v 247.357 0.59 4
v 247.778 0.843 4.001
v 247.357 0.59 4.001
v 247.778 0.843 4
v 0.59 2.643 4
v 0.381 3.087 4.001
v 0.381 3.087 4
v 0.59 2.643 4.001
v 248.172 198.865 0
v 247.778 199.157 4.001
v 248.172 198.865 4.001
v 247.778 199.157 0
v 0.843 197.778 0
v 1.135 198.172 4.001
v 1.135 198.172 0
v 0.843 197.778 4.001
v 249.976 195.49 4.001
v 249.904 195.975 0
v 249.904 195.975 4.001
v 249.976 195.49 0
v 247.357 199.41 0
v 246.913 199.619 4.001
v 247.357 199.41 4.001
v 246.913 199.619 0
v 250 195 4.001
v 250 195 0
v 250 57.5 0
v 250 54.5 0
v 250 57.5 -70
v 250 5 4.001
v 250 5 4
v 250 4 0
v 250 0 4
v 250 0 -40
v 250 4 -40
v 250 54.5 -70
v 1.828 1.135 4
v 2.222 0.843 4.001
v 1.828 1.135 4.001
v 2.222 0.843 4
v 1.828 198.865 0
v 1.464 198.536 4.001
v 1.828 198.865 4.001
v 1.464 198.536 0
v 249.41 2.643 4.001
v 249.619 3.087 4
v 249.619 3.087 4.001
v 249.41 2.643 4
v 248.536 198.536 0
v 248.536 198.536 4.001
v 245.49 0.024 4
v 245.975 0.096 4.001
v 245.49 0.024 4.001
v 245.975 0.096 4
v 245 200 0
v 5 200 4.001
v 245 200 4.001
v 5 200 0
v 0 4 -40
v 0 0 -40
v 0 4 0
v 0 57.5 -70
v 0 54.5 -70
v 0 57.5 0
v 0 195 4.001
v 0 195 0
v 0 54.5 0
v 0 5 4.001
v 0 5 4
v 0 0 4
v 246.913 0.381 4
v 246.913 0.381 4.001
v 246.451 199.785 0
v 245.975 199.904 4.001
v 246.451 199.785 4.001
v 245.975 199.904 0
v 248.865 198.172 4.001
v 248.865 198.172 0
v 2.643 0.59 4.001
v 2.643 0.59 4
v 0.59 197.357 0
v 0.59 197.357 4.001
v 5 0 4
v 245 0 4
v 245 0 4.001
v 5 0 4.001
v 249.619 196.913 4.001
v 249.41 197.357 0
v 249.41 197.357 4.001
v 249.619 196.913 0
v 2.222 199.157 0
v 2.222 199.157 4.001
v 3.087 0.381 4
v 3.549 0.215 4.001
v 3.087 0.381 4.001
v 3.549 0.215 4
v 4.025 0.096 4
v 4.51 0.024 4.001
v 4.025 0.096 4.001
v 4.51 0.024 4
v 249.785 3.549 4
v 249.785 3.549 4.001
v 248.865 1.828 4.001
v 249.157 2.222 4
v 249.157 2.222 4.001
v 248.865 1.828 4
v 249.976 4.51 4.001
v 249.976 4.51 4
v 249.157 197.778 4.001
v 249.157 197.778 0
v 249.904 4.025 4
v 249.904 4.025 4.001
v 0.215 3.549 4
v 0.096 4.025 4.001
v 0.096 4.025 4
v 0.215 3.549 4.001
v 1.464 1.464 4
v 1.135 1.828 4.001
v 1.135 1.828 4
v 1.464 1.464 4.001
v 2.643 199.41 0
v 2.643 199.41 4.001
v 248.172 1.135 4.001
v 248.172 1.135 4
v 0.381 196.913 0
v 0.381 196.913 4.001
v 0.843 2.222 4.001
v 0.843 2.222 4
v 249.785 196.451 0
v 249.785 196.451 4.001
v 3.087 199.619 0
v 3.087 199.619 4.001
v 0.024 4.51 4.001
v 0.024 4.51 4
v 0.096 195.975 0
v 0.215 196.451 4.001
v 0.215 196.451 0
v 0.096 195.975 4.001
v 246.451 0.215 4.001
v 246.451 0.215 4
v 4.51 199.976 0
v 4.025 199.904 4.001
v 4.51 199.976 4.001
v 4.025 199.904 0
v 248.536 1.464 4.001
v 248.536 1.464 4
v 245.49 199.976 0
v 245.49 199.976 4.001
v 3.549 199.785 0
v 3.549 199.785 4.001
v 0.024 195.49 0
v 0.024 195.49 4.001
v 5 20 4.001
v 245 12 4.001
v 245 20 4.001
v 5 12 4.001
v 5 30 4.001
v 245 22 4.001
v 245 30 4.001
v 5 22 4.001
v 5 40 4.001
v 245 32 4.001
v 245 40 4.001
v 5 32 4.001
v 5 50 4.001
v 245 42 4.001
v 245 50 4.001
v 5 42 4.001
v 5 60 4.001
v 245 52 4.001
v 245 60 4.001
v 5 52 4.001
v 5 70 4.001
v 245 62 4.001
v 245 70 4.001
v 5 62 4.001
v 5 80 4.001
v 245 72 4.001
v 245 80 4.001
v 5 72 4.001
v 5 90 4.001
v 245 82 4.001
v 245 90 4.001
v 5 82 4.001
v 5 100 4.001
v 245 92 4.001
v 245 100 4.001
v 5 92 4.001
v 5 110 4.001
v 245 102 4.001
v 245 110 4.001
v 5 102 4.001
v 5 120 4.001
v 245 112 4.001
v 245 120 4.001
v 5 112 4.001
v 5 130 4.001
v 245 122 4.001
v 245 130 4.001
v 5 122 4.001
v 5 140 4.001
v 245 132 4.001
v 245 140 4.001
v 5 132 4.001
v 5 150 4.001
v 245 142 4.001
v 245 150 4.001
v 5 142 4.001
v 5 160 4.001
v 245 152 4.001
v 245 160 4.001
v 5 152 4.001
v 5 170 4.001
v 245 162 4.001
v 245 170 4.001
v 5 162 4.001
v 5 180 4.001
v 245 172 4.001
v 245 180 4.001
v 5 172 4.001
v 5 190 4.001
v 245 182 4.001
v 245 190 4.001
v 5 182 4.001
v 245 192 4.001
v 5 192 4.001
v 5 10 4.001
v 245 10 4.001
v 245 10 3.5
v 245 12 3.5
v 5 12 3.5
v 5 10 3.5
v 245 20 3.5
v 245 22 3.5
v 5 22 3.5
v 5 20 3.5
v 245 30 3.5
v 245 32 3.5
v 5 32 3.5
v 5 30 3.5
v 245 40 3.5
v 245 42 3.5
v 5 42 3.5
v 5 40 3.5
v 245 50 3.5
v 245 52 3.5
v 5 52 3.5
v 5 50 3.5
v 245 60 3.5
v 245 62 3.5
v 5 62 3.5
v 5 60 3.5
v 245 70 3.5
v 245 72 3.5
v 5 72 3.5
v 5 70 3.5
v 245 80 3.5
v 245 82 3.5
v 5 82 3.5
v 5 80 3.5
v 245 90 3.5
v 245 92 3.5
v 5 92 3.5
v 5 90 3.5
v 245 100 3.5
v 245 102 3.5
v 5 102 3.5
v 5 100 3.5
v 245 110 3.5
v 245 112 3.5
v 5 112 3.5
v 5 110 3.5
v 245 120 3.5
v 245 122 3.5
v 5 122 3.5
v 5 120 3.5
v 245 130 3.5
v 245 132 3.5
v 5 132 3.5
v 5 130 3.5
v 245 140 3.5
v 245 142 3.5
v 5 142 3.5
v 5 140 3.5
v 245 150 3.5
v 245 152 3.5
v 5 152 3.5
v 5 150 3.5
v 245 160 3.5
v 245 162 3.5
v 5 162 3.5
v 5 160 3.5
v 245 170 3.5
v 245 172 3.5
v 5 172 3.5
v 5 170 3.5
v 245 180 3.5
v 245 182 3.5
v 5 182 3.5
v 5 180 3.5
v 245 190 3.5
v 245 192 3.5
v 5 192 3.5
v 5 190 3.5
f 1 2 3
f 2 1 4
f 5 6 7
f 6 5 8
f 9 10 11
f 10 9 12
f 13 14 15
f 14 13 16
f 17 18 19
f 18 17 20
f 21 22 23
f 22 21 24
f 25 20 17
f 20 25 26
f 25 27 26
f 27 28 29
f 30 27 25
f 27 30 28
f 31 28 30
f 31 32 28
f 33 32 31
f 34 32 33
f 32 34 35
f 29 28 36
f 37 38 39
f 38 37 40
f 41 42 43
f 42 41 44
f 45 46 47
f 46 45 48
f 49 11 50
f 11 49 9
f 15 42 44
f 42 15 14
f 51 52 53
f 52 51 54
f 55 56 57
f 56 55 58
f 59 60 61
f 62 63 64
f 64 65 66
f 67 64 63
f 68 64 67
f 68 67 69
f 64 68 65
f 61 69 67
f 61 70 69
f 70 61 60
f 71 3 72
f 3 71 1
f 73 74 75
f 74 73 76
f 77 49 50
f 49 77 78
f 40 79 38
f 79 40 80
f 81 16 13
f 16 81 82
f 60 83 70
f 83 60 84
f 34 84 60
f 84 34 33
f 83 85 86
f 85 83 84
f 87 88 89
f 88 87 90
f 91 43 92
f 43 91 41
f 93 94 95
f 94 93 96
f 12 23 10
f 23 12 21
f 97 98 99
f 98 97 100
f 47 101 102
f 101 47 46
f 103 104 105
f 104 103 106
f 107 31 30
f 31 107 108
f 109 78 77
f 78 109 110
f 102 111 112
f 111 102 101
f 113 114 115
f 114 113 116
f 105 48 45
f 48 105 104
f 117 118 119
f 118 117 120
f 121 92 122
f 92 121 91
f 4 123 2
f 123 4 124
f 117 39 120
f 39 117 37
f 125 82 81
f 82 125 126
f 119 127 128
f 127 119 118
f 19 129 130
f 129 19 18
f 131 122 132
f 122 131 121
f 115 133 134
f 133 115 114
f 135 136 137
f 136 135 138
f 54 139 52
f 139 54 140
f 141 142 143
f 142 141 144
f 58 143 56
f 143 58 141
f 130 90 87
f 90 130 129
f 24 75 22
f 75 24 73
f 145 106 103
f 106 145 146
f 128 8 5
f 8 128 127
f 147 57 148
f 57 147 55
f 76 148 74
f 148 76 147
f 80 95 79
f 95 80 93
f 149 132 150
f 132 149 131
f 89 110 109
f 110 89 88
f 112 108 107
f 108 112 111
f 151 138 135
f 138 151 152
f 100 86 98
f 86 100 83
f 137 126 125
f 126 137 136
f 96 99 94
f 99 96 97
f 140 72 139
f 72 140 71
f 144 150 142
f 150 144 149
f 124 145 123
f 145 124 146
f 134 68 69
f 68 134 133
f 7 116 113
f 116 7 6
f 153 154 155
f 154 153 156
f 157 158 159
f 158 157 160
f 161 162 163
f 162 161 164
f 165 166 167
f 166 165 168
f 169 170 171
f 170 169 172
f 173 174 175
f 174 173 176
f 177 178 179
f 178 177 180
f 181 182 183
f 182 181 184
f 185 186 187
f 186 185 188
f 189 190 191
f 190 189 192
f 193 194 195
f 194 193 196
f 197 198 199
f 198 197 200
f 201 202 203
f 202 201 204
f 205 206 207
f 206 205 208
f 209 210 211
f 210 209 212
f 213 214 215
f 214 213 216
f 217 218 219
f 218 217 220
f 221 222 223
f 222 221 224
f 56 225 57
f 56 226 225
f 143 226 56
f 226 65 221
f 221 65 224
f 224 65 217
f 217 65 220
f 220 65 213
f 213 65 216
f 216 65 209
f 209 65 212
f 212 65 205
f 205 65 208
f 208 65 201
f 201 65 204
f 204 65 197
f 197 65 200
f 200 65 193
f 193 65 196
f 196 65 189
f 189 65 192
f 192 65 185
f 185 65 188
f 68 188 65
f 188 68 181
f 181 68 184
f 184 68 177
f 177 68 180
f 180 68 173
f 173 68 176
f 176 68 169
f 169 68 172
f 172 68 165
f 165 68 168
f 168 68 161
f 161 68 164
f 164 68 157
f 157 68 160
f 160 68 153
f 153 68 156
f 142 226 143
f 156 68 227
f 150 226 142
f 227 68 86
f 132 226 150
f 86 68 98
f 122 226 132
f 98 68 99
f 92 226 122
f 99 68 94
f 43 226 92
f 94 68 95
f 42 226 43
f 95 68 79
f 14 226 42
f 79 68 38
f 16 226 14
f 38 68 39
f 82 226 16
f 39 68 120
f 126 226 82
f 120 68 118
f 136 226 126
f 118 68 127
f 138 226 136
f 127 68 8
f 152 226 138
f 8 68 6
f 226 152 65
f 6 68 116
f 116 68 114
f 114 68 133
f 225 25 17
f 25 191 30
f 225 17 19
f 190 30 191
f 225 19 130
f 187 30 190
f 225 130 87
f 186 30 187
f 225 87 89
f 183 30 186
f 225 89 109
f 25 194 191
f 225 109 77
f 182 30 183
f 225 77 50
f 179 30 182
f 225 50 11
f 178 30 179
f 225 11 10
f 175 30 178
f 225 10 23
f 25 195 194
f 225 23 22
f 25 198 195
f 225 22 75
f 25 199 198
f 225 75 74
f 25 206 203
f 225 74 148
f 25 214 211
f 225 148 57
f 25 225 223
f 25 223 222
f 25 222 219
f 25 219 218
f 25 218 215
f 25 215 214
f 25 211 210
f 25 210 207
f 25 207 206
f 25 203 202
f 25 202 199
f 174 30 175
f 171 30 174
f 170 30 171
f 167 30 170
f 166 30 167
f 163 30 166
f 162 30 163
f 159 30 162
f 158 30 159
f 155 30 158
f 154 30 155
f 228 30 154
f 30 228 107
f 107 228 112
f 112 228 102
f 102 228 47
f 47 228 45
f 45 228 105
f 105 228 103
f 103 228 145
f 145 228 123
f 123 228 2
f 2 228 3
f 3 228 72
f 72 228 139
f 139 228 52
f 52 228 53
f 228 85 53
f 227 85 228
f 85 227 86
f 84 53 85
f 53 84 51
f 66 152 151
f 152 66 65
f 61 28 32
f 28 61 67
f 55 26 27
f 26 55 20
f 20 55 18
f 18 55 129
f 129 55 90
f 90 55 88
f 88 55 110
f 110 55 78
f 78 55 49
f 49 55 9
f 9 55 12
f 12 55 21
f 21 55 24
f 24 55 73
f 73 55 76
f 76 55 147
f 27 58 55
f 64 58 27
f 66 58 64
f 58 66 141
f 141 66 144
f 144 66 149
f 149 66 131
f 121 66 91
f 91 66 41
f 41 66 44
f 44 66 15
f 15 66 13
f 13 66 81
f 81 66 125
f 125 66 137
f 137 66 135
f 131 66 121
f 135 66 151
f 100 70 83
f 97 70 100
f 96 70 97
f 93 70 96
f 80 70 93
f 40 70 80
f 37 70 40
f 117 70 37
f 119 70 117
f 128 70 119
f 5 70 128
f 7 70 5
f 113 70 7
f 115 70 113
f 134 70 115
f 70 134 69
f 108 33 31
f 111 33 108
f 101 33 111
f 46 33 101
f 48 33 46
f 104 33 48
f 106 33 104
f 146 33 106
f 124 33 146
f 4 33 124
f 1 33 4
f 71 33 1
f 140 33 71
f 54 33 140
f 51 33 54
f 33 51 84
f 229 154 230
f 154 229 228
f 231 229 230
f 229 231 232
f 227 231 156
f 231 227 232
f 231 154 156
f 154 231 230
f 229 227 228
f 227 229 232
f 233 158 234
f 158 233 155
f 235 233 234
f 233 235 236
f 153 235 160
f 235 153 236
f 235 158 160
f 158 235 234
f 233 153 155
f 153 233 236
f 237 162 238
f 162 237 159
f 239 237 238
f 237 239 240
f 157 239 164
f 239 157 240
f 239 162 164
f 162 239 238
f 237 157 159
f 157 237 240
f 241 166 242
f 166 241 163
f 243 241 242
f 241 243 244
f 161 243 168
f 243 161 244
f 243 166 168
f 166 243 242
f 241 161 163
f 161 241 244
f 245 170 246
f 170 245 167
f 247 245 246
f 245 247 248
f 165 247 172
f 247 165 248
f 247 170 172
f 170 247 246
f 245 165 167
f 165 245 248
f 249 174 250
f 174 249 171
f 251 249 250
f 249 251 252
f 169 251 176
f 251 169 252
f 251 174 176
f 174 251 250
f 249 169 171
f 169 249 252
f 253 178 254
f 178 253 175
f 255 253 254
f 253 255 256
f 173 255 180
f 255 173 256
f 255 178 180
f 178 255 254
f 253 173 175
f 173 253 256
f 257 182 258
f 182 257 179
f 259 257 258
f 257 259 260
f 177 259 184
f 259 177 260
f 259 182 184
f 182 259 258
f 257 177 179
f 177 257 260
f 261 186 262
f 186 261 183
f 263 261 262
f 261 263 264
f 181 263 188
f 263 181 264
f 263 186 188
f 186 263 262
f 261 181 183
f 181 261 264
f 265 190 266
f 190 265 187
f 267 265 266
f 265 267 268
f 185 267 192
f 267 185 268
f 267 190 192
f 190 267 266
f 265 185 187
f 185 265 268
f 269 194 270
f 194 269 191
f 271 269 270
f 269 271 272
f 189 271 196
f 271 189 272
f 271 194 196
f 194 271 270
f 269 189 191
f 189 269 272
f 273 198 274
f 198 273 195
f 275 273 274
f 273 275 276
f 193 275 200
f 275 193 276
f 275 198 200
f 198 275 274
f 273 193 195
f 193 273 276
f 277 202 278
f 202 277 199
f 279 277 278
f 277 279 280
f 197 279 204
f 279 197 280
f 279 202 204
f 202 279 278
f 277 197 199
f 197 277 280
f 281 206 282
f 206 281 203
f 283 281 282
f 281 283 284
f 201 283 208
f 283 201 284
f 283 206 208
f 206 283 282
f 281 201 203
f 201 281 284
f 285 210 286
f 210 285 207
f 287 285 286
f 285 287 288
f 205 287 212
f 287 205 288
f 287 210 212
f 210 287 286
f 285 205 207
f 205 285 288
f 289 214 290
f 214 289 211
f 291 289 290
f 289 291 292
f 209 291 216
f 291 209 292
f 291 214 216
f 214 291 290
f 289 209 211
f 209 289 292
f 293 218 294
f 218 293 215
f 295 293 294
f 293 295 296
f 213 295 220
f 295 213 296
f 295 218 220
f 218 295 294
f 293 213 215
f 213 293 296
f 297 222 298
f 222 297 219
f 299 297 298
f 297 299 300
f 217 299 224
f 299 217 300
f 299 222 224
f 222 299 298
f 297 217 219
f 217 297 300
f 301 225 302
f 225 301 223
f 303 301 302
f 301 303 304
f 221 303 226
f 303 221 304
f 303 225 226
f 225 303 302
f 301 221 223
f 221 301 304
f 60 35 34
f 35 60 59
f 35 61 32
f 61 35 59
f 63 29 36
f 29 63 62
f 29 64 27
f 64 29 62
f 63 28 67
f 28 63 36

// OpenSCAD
//
// Wohnmobil-Fensterbank
// Parametrisches Modell mit optimierter Customizer-Struktur
//

// ----------------------------------------------------------------------
// --- PARAMETER ---
// ----------------------------------------------------------------------

/* [A. GRUNDDIMENSIONEN PLATTE] */
// Breite (X)
01_shelf_width     = 250;   // [50:1:500]
// Tiefe (Y)
01_shelf_depth     = 200;   // [50:1:300]
// Dicke der Platte (Z)
01_shelf_thickness = 4;     // [2:0.5:10]

/* [B. KANTEN & VERFEINERUNG] */
// Radius der Abrundung (Vorder- und Seitenkanten)
02_front_radius    = 5;     // [0:0.5:10]

/* [C. ANTI-RUTSCH RILLEN (Vertiefungen)] */
03_grooves_enabled = true;   // [false, true] EIN/AUS-Schalter
// Tiefe der Rille
03_groove_depth    = 0.5;   // [0.1:0.1:2]
// Breite der Rille (entlang Y)
03_groove_width_x  = 2;     // [0.5:0.5:5]
// Abstand der Rillen (Mitte zu Mitte in Y)
03_groove_spacing_y= 10;    // [5:1:30]
// Startposition in Y (vom hinteren Rand y=0)
03_groove_offset_y = 10;    // [0:1:50]

/* [D. KLEMMUNG / HALTERUNG] */
// Abstand zwischen den INNENflächen der Halter (zu greifendes Element)
04_board_thickness = 50;    // [10:1:100]
// Spiel für die Klemmung (Anpassung an Druckergenauigkeit)
04_fit_clearance   = 0.5;   // [0:0.05:1]

/* [E. HALTERUNGS-MASSE] */
// Dicke des äußeren Halters (Y)
05_outer_br_thickness = 4;   // [1:1:10]
// Höhe des äußeren Halters (Z)
05_outer_br_height    = 40;  // [10:1:100]
// Dicke des inneren Halters (Y)
05_inner_br_thickness = 3;   // [1:1:10]
// Höhe des inneren Halters (Z)
05_inner_br_height    = 70;  // [10:1:100]

/* [F. OPTIONALER RAND (Deaktiviert)] */
06_rim_enabled     = false;  // [false, true] Rand an/aus
// Breite / Dicke des Randes (X/Y)
06_rim_width       = 5;     // [1:1:10]
// Höhe des Randes nach unten (Z)
06_rim_height      = 5;     // [1:1:10]


// ----------------------------------------------------------------------
// ---------- MODULE ----------
// (Alle Modul-Variablen wurden mit den entsprechenden Präfixen angepasst)
// ----------------------------------------------------------------------

// Modul zum Erstellen der Rillen (wird subtrahiert)
module anti_slip_grooves() {
   
    if (03_grooves_enabled) {
        
        num_grooves = floor((01_shelf_depth - 03_groove_offset_y) / 03_groove_spacing_y);
        
        for (i = [0 : 1 : num_grooves - 1]) {
            
            current_y = 03_groove_offset_y + i * 03_groove_spacing_y;
            groove_start_x = 02_front_radius; 
            groove_length_x = 01_shelf_width - 2 * 02_front_radius;
            
            // Rillenobjekt (Cube)
            translate([groove_start_x, current_y, 01_shelf_thickness - 03_groove_depth])
            cube([groove_length_x, 03_groove_width_x, 03_groove_depth + 0.01], center = false);
        }
    }
}


// Grundplatte + optionaler Rim
module base_plate_with_rim() {

    // --- 1. Korrigierte Grundplatte (Positiv-Objekt) ---
    difference() {
        
        union() {
            // a) Verrundeter Hauptteil
            translate([02_front_radius, 02_front_radius, 0])
            minkowski() {
                cube([01_shelf_width - 2*02_front_radius, 01_shelf_depth - 2*02_front_radius, 01_shelf_thickness], center = false);
                cylinder(r = 02_front_radius, h = 0.001, $fn = 64);
            }
            
            // b) Hinterer, gerader Teil
            translate([0, 0, 0])
                cube([01_shelf_width, 02_front_radius, 01_shelf_thickness], center = false);
        }
        
        // 2. Die ANTI-RUTSCH RILLEN (Negativ-Objekt)
        anti_slip_grooves();
        
    }
    
    // --- 2. Optionaler Rim (Derzeit deaktiviert) ---
    if (06_rim_enabled && 06_rim_height > 0 && 06_rim_width > 0) {
        
        inner_br_start_y = 05_outer_br_thickness + 04_board_thickness + 04_fit_clearance;
        inner_br_front_y = inner_br_start_y + 05_inner_br_thickness;
        rim_y_start = inner_br_front_y;
        rim_y_end   = 01_shelf_depth - 02_front_radius;
        rim_depth_y = rim_y_end - rim_y_start;
        
        if (rim_depth_y > 0) {
            
            rim_front_thickness = 06_rim_width;
            
            // FRONT-RAND (Verrundet)
            translate([02_front_radius, 01_shelf_depth - rim_front_thickness, -06_rim_height])
            minkowski() {
                cube([01_shelf_width - 2*02_front_radius, rim_front_thickness - 02_front_radius, 06_rim_height], center = false);
                cylinder(r = 02_front_radius, h = 0.001, $fn = 64);
            }
            // LINKER RAND (seitlich)
            translate([0, rim_y_start, -06_rim_height])
                cube([06_rim_width, rim_depth_y, 06_rim_height], center = false);
            // RECHTER RAND (seitlich)
            translate([01_shelf_width - 06_rim_width, rim_y_start, -06_rim_height])
                cube([06_rim_width, rim_depth_y, 06_rim_height], center = false);
        }
    }
}

// Halterungen auf der UNTERSEITE
module brackets() {
    // äußerer Halter (direkt an der Rückkante, nach UNTEN)
    translate([0, 0, -05_outer_br_height])
        cube([01_shelf_width, 05_outer_br_thickness, 05_outer_br_height], center = false);

    // innerer Halter (weiter vorne im Raum)
    translate([0,
               05_outer_br_thickness + 04_board_thickness + 04_fit_clearance,
               -05_inner_br_height])
        cube([01_shelf_width, 05_inner_br_thickness, 05_inner_br_height], center = false);
}

module fensterbank() {
    base_plate_with_rim();
    brackets();
}

// Aufruf
fensterbank();
